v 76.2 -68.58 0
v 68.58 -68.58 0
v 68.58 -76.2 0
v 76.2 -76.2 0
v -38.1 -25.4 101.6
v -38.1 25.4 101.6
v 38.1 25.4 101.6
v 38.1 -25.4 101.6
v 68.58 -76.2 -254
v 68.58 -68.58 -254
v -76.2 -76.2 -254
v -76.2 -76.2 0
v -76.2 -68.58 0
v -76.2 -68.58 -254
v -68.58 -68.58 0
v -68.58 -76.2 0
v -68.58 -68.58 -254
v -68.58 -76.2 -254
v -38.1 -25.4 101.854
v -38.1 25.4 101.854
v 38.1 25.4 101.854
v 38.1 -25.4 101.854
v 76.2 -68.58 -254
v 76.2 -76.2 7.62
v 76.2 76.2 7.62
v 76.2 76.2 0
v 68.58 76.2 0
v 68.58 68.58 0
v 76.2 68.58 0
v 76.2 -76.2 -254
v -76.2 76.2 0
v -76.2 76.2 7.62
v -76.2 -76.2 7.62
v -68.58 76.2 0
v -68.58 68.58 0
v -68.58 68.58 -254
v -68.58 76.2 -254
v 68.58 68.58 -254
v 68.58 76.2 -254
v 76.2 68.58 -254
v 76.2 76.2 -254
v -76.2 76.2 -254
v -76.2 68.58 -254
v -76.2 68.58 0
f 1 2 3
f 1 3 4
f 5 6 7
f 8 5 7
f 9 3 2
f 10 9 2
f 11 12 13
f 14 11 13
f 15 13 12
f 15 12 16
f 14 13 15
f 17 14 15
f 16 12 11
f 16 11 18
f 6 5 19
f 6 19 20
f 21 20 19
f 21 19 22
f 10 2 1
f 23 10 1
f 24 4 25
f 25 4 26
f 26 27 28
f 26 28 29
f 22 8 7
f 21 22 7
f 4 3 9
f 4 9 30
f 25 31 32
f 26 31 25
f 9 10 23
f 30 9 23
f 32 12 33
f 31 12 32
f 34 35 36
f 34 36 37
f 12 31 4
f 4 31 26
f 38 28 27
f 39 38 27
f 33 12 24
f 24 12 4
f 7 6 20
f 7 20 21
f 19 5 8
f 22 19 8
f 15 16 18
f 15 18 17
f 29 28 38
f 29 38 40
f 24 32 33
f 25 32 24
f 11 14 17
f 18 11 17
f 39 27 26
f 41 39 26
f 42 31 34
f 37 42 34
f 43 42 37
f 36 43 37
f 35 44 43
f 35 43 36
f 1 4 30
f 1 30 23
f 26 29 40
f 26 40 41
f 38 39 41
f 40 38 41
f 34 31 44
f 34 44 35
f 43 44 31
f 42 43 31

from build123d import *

# Parameters (mm, degrees)
F1_W     = 7.62
F1_H     = 7.62
F2_DEPTH = 254
F0_W     = 152.4
F0_H     = 152.4
F3_DEPTH = 7.62
F5_W     = 76.2
F5_H     = 50.8
F6_DEPTH = 0.254


with BuildPart() as f2:
    # F1 (on face) → F2 (new body)
    with BuildSketch(Plane.XY):
        with Locations((-72.39, -72.39)):
            Rectangle(F1_W, F1_H)
    extrude(amount=-F2_DEPTH)


with BuildPart() as f2b:
    # F1 (on face) → F2, piece 2 (new body)
    with BuildSketch(Plane.XY):
        with Locations((72.39, -72.39)):
            Rectangle(F1_W, F1_H)
    extrude(amount=-F2_DEPTH)


with BuildPart() as f2c:
    # F1 (on face) → F2, piece 3 (new body)
    with BuildSketch(Plane.XY):
        with Locations((72.39, 72.39)):
            Rectangle(F1_W, F1_H)
    extrude(amount=-F2_DEPTH)


with BuildPart() as f2d:
    # F1 (on face) → F2, piece 4 (new body)
    with BuildSketch(Plane.XY):
        with Locations((-72.39, 72.39)):
            Rectangle(F1_W, F1_H)
    extrude(amount=-F2_DEPTH)


with BuildPart() as f3:
    # F0 (on Top) → F3 (new body)
    with BuildSketch(Plane.XY):
        Rectangle(F0_W, F0_H)
    extrude(amount=F3_DEPTH)


with BuildPart() as f6:
    # F5 (on offset) → F6 (new body)
    with BuildSketch(Plane.XY.offset(101.6)):
        Rectangle(F5_W, F5_H)
    extrude(amount=F6_DEPTH)


solid = Compound([f2.part, f2b.part, f2c.part, f2d.part, f3.part, f6.part])
